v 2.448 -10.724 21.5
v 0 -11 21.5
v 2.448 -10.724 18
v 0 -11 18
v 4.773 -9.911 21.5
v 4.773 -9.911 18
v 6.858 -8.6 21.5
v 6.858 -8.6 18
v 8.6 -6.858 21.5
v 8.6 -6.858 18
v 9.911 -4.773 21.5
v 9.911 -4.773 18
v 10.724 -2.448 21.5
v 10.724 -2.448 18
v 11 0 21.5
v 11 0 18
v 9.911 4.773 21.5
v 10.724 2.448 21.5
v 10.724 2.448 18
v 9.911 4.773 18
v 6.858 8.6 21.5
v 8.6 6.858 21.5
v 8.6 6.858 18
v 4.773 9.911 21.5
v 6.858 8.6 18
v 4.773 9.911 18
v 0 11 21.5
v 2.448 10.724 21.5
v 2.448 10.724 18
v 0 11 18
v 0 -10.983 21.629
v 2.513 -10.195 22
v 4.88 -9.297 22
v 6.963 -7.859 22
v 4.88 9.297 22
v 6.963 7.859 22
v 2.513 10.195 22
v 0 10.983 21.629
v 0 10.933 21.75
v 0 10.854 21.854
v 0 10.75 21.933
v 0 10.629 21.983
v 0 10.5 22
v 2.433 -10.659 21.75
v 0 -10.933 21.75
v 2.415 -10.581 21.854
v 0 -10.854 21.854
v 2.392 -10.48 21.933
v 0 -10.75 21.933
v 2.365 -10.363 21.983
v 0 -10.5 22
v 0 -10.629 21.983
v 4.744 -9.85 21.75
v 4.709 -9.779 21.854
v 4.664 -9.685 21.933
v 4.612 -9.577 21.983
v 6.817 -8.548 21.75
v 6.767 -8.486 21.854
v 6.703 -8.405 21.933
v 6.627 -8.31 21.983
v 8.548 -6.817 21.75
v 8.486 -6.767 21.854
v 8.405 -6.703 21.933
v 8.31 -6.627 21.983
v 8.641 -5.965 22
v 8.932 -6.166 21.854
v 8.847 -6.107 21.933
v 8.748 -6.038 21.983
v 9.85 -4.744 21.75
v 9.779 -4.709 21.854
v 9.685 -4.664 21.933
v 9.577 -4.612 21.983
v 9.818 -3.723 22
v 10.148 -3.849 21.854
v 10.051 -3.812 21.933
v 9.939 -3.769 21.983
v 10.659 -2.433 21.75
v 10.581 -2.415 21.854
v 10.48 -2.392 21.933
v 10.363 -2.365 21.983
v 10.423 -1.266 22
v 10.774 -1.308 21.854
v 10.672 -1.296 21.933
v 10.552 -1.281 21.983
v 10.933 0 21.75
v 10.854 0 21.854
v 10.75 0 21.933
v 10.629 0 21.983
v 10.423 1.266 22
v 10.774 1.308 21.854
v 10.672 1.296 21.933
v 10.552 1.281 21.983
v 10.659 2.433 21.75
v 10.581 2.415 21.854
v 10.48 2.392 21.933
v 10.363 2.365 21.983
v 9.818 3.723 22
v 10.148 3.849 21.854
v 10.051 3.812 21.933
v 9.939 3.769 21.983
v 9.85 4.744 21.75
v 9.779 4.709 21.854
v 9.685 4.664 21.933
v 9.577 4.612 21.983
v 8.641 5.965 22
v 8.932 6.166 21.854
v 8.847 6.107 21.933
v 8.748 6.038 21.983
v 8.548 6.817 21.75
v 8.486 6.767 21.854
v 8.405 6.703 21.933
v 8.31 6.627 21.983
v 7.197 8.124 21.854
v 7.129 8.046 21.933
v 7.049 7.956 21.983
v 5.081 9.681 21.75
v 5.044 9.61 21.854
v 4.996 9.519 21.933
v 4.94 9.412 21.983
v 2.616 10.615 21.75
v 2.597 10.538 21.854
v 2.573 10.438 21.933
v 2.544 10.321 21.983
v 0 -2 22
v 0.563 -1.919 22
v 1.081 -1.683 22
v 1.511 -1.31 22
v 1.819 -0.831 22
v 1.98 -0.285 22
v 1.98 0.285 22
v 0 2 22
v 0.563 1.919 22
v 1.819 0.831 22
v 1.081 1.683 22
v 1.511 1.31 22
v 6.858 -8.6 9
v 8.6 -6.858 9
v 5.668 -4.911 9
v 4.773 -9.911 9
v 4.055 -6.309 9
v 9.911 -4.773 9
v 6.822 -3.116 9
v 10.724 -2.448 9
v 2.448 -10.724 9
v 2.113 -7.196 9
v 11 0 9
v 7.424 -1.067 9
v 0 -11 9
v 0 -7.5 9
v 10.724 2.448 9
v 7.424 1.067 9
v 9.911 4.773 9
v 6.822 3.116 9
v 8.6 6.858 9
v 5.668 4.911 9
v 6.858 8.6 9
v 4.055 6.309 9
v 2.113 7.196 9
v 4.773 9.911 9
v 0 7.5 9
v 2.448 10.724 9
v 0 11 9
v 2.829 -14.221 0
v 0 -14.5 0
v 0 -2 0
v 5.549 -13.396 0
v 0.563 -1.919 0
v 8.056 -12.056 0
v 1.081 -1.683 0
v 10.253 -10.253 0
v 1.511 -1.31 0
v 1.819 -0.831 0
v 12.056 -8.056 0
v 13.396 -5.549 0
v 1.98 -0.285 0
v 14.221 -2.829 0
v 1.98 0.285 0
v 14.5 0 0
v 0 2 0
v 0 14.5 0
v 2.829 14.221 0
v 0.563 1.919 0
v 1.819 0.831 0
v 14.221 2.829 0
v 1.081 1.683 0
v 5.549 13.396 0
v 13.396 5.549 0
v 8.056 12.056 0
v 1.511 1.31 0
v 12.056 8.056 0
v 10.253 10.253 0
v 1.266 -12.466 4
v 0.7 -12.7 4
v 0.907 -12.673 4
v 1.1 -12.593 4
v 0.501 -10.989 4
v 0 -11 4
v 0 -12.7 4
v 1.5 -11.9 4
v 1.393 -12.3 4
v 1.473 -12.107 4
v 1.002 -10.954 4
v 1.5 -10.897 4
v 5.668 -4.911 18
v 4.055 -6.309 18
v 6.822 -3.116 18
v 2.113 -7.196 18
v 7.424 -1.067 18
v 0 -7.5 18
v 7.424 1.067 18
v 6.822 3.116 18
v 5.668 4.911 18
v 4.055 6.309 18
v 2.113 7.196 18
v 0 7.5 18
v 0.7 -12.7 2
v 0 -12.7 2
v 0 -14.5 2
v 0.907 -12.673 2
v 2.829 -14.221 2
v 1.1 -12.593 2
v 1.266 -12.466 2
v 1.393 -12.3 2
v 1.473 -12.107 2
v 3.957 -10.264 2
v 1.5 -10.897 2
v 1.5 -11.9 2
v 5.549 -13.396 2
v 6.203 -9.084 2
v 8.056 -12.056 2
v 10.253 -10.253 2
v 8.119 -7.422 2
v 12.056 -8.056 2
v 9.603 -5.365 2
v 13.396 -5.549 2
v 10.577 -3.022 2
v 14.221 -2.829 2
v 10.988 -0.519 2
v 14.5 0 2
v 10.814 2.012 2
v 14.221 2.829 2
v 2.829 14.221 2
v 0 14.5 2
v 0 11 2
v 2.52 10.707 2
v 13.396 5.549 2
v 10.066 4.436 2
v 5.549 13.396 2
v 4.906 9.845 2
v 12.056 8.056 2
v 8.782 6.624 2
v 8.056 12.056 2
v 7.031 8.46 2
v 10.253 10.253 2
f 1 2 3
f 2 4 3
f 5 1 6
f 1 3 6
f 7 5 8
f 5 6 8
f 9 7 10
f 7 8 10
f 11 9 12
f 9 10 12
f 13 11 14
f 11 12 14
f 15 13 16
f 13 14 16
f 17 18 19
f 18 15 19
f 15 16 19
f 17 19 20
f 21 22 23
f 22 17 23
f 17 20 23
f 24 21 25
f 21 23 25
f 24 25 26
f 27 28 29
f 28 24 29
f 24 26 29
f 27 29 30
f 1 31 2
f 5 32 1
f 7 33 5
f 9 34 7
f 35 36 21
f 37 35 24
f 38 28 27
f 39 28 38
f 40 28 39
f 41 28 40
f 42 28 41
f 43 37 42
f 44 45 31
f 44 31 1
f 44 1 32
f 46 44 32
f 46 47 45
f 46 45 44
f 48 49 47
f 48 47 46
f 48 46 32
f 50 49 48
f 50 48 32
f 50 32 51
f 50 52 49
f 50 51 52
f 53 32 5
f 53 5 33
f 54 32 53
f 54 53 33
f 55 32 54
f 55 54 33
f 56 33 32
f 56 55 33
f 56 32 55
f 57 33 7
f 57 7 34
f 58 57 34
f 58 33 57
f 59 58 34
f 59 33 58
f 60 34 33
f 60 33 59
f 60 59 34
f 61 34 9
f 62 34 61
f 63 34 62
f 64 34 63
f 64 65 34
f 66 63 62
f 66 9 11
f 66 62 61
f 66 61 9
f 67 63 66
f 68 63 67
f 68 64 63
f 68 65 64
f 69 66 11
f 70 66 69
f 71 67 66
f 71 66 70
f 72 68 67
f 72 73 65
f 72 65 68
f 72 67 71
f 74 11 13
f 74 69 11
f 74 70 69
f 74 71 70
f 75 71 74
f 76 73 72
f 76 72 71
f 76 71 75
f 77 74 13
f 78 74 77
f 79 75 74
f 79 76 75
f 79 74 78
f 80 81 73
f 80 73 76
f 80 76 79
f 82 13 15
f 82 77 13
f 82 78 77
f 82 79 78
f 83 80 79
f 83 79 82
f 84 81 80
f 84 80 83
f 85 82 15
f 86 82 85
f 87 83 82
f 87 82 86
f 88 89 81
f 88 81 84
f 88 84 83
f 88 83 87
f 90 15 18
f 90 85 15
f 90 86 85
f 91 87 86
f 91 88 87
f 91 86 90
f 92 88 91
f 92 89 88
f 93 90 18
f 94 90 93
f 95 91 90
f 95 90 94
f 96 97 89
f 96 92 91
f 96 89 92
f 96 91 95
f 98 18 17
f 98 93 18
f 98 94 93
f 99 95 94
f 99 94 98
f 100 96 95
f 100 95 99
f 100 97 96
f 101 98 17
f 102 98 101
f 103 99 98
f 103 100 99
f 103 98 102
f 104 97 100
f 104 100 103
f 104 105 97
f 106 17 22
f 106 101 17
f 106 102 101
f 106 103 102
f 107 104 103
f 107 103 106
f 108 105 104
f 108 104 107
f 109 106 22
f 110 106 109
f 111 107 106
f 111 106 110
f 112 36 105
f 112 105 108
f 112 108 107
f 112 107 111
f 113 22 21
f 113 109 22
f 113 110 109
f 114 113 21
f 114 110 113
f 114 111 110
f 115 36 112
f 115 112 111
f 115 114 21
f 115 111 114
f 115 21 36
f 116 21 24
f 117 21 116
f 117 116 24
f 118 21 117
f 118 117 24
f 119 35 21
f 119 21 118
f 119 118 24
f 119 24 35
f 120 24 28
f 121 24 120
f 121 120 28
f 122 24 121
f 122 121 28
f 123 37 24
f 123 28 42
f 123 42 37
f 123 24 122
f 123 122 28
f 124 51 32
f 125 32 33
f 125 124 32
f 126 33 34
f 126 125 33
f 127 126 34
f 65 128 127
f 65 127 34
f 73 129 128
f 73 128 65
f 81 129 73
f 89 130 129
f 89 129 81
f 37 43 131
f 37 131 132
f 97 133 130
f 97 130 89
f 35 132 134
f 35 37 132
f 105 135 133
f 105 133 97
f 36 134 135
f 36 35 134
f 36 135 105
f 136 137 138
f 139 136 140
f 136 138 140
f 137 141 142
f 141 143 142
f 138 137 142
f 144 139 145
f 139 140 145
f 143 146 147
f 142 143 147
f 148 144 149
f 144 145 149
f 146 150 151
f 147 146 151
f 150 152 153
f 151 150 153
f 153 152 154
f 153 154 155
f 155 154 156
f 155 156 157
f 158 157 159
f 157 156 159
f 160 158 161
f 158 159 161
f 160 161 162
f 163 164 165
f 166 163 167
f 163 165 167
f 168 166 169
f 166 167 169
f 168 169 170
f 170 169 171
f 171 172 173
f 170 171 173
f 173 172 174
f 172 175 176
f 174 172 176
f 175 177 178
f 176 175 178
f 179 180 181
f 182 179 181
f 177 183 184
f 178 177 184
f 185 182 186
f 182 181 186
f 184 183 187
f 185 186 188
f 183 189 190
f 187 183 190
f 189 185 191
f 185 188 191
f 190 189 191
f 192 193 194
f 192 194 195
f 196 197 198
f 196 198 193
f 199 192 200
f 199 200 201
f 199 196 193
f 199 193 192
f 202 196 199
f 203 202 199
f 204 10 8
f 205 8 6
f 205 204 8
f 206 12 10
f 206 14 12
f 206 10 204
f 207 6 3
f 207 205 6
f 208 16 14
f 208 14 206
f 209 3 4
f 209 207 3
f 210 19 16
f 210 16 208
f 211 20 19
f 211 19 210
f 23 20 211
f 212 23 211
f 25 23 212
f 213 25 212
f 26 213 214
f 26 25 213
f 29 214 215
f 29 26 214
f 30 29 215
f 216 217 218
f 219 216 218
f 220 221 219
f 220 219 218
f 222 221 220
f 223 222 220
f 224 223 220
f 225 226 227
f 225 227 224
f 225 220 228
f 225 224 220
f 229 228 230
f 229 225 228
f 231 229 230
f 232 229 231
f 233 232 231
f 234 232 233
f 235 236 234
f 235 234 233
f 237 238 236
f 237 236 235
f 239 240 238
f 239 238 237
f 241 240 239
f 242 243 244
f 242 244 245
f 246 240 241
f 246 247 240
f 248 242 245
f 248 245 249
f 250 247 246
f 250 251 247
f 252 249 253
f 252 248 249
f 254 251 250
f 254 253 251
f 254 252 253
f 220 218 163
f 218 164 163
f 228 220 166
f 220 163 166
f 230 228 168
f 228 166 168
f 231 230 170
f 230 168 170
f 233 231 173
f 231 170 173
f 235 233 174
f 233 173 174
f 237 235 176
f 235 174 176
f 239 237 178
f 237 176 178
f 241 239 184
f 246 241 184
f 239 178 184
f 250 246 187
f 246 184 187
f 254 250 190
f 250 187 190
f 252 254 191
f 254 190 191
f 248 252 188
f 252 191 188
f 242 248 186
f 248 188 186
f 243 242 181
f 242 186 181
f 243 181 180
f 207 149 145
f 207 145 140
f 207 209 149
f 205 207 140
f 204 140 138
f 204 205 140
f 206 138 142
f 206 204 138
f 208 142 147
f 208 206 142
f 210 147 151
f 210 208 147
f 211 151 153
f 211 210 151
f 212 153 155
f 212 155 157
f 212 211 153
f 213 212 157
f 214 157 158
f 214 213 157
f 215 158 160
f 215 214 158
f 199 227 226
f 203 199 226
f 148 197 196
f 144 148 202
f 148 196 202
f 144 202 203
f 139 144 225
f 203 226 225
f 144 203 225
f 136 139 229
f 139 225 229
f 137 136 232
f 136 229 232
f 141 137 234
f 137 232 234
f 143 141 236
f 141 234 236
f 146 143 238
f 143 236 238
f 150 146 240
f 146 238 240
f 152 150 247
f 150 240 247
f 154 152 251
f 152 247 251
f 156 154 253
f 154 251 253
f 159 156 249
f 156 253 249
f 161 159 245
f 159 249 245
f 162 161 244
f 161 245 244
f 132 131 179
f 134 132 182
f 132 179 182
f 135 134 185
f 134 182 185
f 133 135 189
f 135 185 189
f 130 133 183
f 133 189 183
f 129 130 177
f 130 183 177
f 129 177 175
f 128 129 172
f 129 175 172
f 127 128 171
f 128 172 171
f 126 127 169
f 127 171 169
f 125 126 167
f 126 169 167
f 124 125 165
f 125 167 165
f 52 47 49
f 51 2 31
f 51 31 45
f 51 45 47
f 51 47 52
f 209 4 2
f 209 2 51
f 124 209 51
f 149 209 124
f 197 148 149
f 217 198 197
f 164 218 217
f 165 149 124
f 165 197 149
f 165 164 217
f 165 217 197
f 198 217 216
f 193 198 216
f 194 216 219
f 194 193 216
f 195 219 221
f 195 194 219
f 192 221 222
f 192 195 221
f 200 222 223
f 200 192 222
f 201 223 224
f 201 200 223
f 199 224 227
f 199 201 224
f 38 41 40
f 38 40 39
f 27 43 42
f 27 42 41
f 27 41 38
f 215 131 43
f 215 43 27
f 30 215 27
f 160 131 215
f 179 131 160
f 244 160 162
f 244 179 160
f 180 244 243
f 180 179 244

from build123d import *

# Parameters (mm, degrees)
F0_R      = 14.5
F1_DEPTH  = 2
F2_R      = 11
F3_DEPTH  = 20
F4_R      = 2
F5_DEPTH  = 22.001
F6_W      = 3
F6_H      = 3.4
F7_DEPTH  = 2
F8_R      = 0.8
F9_R      = 0.5
F11_W     = 28.85052
F11_H     = 54.144128
F12_DEPTH = 22.001
F14_W     = 3.5
F14_H     = 9


with BuildPart() as f1:
    # F0 (on Top) → F1 (new body)
    with BuildSketch(Plane.XY):
        Circle(F0_R)
    extrude(amount=F1_DEPTH)

    # F2 (on face) → F3 (join)
    with BuildSketch(Plane.XY.offset(2)):
        Circle(F2_R)
    extrude(amount=F3_DEPTH)

    # F4 (on face) → F5 (cut, through all)
    with BuildSketch(Plane(origin=(0, 0, 0), x_dir=(1, 0, 0), z_dir=(0, 0, -1))):
        Circle(F4_R)
    extrude(amount=-F5_DEPTH, mode=Mode.SUBTRACT)

    # F6 (on face) → F7 (join)
    with BuildSketch(Plane.XY.offset(2)):
        with Locations((0, -11)):
            Rectangle(F6_W, F6_H)
    extrude(amount=F7_DEPTH)

    # F8
    f8_edges = [f1.edges().sort_by_distance(p)[0] for p in [
        (-1.5, -12.7, 3),
        (1.5, -12.7, 3),
    ]]
    fillet(f8_edges, radius=F8_R)

    # F9
    f9_edges = [f1.edges().sort_by_distance(p)[0] for p in [
        (-11, 0, 22),
    ]]
    fillet(f9_edges, radius=F9_R)

    # F11 (on Top) → F12 (cut, through all)
    with BuildSketch(Plane.XY):
        with Locations((-14.42526, 2.568883)):
            Rectangle(F11_W, F11_H)
    extrude(amount=F12_DEPTH, mode=Mode.SUBTRACT)

    # F14 (on Front) → F15 (revolve, cut)
    with BuildSketch(Plane.XZ):
        with Locations((9.25, 13.5)):
            Rectangle(F14_W, F14_H)
    revolve(axis=Axis((0, 0, 13.307823), (0, 0, 1)), mode=Mode.SUBTRACT)


solid = f1.part
